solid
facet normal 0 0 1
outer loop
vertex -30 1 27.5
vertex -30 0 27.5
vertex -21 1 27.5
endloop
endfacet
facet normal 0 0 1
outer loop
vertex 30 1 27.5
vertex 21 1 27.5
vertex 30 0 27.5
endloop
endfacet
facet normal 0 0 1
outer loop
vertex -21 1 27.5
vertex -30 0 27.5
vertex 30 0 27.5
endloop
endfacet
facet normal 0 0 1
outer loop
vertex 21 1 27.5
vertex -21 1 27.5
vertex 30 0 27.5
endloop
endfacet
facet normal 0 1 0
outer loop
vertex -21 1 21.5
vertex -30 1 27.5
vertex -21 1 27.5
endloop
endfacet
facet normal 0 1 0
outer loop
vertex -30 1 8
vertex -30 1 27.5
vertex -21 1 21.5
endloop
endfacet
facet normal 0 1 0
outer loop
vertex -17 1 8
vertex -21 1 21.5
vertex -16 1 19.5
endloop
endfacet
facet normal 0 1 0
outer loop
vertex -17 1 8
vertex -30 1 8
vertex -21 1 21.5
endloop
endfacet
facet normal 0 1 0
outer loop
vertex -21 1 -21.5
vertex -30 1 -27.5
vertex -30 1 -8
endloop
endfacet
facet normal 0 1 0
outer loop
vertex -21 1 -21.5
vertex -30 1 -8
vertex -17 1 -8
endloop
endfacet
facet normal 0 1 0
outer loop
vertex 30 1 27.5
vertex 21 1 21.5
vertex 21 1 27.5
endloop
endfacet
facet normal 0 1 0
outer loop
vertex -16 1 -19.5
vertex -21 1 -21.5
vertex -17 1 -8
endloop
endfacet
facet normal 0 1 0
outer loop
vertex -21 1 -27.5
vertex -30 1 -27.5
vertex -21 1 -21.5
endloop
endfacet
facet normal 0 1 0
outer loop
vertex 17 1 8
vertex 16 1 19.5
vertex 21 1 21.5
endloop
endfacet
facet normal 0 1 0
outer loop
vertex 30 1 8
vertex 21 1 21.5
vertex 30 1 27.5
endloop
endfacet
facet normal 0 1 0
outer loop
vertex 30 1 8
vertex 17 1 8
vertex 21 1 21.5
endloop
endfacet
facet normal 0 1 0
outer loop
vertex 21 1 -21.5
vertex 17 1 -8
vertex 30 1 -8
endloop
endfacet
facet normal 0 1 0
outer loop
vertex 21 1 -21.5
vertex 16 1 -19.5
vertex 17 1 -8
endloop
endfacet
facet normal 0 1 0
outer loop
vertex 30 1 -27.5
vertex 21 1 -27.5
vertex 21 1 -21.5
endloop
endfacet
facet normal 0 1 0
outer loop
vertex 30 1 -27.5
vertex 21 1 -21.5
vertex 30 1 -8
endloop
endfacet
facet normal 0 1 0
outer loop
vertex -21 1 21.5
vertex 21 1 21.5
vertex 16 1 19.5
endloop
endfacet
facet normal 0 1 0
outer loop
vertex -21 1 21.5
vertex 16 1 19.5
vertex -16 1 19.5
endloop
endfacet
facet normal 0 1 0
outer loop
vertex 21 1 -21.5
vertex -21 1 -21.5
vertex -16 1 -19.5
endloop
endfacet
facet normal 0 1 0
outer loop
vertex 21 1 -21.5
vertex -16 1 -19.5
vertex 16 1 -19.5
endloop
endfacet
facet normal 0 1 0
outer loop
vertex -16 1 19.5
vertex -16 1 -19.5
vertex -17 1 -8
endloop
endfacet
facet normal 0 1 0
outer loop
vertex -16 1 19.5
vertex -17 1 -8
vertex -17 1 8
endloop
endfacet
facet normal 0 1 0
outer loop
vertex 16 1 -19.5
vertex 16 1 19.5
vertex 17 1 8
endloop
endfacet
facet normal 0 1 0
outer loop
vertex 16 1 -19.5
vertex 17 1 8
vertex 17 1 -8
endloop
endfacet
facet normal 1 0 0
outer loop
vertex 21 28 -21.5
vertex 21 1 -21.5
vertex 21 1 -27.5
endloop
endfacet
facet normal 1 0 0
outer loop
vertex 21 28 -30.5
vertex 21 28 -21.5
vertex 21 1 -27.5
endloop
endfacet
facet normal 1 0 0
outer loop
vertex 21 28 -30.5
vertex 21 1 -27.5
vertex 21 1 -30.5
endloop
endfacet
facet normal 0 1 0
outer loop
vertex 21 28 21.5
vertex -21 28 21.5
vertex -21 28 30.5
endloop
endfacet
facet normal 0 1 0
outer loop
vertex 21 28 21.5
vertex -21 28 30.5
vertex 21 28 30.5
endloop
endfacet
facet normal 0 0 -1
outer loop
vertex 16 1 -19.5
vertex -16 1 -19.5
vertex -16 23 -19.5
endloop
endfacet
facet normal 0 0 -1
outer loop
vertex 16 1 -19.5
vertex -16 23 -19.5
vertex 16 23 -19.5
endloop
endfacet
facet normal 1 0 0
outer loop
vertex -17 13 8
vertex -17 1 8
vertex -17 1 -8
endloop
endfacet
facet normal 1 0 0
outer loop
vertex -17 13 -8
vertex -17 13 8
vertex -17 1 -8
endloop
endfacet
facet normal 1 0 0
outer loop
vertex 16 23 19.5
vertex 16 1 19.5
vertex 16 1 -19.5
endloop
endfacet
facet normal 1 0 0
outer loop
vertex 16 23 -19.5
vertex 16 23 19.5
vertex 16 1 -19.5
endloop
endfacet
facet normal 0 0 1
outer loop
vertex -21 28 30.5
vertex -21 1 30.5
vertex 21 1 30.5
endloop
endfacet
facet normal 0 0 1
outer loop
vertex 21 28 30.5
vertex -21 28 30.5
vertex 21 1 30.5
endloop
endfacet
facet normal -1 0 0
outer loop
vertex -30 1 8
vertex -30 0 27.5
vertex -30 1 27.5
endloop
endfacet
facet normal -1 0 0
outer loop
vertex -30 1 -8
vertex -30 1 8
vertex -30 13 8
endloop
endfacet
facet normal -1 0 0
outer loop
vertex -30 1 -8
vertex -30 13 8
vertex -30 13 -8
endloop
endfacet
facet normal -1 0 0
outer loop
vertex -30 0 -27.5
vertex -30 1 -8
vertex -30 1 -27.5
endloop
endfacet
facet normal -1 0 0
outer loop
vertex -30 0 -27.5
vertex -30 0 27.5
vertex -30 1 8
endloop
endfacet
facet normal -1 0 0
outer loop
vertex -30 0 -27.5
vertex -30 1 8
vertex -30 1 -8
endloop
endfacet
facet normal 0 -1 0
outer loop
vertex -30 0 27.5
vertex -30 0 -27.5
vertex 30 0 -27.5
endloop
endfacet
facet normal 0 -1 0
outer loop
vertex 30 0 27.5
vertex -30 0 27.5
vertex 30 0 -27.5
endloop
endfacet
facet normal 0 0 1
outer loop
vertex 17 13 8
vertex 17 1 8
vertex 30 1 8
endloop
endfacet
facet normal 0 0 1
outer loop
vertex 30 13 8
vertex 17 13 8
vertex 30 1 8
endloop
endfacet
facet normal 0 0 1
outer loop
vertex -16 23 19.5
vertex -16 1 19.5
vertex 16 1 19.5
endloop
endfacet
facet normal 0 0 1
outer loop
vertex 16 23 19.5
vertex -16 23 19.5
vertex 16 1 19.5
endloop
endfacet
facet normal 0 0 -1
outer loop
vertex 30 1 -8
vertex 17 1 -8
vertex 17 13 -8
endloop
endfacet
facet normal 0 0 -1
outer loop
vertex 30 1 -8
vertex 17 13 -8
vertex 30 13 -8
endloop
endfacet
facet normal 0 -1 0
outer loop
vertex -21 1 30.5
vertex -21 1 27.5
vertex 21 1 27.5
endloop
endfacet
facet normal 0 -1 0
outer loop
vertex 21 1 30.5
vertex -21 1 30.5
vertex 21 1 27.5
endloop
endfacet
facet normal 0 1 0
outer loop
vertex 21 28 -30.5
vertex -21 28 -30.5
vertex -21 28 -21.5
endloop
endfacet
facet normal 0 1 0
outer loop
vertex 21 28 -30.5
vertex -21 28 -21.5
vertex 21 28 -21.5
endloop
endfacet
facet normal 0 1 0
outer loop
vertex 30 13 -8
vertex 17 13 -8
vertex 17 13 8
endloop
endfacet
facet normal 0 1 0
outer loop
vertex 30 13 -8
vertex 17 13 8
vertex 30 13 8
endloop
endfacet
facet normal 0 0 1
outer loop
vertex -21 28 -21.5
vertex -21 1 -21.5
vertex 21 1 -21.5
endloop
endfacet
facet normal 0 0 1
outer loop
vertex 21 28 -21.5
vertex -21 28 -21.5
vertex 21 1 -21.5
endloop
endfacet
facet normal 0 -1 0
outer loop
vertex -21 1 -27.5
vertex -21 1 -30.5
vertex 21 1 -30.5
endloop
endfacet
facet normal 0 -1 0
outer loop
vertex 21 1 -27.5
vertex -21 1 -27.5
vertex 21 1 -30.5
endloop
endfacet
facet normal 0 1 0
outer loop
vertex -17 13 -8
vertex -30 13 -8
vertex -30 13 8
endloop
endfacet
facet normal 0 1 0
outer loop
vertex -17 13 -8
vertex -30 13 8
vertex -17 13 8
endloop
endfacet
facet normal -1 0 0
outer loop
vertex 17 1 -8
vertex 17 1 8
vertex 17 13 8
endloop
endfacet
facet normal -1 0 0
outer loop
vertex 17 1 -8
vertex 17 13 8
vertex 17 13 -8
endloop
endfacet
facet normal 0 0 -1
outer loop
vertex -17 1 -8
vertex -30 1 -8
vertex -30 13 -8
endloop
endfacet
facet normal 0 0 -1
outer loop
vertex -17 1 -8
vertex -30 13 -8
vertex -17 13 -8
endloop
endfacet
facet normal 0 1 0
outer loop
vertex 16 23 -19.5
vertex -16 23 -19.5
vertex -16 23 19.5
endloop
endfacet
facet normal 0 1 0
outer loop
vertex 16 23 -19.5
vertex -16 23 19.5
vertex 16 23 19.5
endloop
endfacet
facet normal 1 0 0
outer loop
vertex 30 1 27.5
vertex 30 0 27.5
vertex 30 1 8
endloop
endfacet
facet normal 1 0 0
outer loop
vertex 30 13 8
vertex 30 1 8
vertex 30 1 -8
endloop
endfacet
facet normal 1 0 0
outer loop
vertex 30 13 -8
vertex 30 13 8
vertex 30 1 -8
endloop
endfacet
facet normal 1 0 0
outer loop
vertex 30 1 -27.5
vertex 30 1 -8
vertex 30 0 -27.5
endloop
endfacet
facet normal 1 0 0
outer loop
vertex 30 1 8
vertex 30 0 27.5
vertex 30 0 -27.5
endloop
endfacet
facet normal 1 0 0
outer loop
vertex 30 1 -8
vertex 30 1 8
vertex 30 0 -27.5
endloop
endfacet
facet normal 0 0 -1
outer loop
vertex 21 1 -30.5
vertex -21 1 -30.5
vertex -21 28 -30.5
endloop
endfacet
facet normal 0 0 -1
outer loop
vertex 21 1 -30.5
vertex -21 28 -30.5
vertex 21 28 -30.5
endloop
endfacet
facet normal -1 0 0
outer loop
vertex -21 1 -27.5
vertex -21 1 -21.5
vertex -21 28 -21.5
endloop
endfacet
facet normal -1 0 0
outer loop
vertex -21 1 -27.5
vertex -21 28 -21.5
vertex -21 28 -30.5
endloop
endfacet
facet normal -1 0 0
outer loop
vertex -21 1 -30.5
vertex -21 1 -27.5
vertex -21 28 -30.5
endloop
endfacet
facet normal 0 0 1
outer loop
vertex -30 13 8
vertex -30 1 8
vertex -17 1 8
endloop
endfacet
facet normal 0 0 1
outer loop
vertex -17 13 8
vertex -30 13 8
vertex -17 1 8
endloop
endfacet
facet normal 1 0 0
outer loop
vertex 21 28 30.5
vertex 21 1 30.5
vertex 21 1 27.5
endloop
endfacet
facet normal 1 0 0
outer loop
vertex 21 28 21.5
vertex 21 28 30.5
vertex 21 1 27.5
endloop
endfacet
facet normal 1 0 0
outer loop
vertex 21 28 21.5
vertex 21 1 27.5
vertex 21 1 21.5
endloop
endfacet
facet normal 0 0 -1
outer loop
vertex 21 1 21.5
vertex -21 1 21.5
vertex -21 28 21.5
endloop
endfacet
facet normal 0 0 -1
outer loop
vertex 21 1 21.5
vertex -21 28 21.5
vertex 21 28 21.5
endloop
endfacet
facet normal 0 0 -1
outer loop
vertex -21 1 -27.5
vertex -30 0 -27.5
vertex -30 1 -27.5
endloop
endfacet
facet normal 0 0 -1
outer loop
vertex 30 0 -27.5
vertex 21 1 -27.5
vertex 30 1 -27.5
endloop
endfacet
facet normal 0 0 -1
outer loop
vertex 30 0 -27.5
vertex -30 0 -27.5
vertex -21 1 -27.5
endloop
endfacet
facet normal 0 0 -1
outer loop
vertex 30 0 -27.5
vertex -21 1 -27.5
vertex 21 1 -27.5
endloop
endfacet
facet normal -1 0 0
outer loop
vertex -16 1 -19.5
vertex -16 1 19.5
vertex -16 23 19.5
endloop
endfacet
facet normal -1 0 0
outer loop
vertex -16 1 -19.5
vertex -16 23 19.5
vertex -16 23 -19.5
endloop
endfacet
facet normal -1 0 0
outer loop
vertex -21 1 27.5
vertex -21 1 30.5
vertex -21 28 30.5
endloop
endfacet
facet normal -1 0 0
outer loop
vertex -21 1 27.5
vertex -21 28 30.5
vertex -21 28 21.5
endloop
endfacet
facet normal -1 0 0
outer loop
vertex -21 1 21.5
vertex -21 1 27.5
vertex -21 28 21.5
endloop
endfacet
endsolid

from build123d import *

# Parameters (mm, degrees)
SKETCH1_W           = 60
SKETCH1_H           = 55
BOSS_EXTRUDE1_DEPTH = 1
SKETCH2_W           = 42
SKETCH2_H           = 9
BOSS_EXTRUDE2_DEPTH = 27
SKETCH3_W           = 13
SKETCH3_H           = 16
BOSS_EXTRUDE3_DEPTH = 12
SKETCH4_W           = 32
SKETCH4_H           = 39
BOSS_EXTRUDE4_DEPTH = 22


with BuildPart() as part:
    # Sketch1 → Boss-Extrude1 (new body)
    with BuildSketch(Plane(origin=(0, 0, 0), x_dir=(1, 0, 0), z_dir=(0, 1, 0))):
        Rectangle(SKETCH1_W, SKETCH1_H)
    extrude(amount=BOSS_EXTRUDE1_DEPTH)

    # Sketch2 → Boss-Extrude2 (add)
    with BuildSketch(Plane(origin=(0, 1, 0), x_dir=(1, 0, 0), z_dir=(0, 1, 0))):
        with Locations((0, 26)):
            Rectangle(SKETCH2_W, SKETCH2_H)
        with Locations((0, -26)):
            Rectangle(SKETCH2_W, SKETCH2_H)
    extrude(amount=BOSS_EXTRUDE2_DEPTH)

    # Sketch3 → Boss-Extrude3 (add)
    with BuildSketch(Plane(origin=(0, 1, 0), x_dir=(1, 0, 0), z_dir=(0, 1, 0))):
        with Locations((-23.5, 0)):
            Rectangle(SKETCH3_W, SKETCH3_H)
        with Locations((23.5, 0)):
            Rectangle(SKETCH3_W, SKETCH3_H)
    extrude(amount=BOSS_EXTRUDE3_DEPTH)

    # Sketch4 → Boss-Extrude4 (add)
    with BuildSketch(Plane(origin=(0, 1, 0), x_dir=(1, 0, 0), z_dir=(0, 1, 0))):
        Rectangle(SKETCH4_W, SKETCH4_H)
    extrude(amount=BOSS_EXTRUDE4_DEPTH)


solid = part.part
